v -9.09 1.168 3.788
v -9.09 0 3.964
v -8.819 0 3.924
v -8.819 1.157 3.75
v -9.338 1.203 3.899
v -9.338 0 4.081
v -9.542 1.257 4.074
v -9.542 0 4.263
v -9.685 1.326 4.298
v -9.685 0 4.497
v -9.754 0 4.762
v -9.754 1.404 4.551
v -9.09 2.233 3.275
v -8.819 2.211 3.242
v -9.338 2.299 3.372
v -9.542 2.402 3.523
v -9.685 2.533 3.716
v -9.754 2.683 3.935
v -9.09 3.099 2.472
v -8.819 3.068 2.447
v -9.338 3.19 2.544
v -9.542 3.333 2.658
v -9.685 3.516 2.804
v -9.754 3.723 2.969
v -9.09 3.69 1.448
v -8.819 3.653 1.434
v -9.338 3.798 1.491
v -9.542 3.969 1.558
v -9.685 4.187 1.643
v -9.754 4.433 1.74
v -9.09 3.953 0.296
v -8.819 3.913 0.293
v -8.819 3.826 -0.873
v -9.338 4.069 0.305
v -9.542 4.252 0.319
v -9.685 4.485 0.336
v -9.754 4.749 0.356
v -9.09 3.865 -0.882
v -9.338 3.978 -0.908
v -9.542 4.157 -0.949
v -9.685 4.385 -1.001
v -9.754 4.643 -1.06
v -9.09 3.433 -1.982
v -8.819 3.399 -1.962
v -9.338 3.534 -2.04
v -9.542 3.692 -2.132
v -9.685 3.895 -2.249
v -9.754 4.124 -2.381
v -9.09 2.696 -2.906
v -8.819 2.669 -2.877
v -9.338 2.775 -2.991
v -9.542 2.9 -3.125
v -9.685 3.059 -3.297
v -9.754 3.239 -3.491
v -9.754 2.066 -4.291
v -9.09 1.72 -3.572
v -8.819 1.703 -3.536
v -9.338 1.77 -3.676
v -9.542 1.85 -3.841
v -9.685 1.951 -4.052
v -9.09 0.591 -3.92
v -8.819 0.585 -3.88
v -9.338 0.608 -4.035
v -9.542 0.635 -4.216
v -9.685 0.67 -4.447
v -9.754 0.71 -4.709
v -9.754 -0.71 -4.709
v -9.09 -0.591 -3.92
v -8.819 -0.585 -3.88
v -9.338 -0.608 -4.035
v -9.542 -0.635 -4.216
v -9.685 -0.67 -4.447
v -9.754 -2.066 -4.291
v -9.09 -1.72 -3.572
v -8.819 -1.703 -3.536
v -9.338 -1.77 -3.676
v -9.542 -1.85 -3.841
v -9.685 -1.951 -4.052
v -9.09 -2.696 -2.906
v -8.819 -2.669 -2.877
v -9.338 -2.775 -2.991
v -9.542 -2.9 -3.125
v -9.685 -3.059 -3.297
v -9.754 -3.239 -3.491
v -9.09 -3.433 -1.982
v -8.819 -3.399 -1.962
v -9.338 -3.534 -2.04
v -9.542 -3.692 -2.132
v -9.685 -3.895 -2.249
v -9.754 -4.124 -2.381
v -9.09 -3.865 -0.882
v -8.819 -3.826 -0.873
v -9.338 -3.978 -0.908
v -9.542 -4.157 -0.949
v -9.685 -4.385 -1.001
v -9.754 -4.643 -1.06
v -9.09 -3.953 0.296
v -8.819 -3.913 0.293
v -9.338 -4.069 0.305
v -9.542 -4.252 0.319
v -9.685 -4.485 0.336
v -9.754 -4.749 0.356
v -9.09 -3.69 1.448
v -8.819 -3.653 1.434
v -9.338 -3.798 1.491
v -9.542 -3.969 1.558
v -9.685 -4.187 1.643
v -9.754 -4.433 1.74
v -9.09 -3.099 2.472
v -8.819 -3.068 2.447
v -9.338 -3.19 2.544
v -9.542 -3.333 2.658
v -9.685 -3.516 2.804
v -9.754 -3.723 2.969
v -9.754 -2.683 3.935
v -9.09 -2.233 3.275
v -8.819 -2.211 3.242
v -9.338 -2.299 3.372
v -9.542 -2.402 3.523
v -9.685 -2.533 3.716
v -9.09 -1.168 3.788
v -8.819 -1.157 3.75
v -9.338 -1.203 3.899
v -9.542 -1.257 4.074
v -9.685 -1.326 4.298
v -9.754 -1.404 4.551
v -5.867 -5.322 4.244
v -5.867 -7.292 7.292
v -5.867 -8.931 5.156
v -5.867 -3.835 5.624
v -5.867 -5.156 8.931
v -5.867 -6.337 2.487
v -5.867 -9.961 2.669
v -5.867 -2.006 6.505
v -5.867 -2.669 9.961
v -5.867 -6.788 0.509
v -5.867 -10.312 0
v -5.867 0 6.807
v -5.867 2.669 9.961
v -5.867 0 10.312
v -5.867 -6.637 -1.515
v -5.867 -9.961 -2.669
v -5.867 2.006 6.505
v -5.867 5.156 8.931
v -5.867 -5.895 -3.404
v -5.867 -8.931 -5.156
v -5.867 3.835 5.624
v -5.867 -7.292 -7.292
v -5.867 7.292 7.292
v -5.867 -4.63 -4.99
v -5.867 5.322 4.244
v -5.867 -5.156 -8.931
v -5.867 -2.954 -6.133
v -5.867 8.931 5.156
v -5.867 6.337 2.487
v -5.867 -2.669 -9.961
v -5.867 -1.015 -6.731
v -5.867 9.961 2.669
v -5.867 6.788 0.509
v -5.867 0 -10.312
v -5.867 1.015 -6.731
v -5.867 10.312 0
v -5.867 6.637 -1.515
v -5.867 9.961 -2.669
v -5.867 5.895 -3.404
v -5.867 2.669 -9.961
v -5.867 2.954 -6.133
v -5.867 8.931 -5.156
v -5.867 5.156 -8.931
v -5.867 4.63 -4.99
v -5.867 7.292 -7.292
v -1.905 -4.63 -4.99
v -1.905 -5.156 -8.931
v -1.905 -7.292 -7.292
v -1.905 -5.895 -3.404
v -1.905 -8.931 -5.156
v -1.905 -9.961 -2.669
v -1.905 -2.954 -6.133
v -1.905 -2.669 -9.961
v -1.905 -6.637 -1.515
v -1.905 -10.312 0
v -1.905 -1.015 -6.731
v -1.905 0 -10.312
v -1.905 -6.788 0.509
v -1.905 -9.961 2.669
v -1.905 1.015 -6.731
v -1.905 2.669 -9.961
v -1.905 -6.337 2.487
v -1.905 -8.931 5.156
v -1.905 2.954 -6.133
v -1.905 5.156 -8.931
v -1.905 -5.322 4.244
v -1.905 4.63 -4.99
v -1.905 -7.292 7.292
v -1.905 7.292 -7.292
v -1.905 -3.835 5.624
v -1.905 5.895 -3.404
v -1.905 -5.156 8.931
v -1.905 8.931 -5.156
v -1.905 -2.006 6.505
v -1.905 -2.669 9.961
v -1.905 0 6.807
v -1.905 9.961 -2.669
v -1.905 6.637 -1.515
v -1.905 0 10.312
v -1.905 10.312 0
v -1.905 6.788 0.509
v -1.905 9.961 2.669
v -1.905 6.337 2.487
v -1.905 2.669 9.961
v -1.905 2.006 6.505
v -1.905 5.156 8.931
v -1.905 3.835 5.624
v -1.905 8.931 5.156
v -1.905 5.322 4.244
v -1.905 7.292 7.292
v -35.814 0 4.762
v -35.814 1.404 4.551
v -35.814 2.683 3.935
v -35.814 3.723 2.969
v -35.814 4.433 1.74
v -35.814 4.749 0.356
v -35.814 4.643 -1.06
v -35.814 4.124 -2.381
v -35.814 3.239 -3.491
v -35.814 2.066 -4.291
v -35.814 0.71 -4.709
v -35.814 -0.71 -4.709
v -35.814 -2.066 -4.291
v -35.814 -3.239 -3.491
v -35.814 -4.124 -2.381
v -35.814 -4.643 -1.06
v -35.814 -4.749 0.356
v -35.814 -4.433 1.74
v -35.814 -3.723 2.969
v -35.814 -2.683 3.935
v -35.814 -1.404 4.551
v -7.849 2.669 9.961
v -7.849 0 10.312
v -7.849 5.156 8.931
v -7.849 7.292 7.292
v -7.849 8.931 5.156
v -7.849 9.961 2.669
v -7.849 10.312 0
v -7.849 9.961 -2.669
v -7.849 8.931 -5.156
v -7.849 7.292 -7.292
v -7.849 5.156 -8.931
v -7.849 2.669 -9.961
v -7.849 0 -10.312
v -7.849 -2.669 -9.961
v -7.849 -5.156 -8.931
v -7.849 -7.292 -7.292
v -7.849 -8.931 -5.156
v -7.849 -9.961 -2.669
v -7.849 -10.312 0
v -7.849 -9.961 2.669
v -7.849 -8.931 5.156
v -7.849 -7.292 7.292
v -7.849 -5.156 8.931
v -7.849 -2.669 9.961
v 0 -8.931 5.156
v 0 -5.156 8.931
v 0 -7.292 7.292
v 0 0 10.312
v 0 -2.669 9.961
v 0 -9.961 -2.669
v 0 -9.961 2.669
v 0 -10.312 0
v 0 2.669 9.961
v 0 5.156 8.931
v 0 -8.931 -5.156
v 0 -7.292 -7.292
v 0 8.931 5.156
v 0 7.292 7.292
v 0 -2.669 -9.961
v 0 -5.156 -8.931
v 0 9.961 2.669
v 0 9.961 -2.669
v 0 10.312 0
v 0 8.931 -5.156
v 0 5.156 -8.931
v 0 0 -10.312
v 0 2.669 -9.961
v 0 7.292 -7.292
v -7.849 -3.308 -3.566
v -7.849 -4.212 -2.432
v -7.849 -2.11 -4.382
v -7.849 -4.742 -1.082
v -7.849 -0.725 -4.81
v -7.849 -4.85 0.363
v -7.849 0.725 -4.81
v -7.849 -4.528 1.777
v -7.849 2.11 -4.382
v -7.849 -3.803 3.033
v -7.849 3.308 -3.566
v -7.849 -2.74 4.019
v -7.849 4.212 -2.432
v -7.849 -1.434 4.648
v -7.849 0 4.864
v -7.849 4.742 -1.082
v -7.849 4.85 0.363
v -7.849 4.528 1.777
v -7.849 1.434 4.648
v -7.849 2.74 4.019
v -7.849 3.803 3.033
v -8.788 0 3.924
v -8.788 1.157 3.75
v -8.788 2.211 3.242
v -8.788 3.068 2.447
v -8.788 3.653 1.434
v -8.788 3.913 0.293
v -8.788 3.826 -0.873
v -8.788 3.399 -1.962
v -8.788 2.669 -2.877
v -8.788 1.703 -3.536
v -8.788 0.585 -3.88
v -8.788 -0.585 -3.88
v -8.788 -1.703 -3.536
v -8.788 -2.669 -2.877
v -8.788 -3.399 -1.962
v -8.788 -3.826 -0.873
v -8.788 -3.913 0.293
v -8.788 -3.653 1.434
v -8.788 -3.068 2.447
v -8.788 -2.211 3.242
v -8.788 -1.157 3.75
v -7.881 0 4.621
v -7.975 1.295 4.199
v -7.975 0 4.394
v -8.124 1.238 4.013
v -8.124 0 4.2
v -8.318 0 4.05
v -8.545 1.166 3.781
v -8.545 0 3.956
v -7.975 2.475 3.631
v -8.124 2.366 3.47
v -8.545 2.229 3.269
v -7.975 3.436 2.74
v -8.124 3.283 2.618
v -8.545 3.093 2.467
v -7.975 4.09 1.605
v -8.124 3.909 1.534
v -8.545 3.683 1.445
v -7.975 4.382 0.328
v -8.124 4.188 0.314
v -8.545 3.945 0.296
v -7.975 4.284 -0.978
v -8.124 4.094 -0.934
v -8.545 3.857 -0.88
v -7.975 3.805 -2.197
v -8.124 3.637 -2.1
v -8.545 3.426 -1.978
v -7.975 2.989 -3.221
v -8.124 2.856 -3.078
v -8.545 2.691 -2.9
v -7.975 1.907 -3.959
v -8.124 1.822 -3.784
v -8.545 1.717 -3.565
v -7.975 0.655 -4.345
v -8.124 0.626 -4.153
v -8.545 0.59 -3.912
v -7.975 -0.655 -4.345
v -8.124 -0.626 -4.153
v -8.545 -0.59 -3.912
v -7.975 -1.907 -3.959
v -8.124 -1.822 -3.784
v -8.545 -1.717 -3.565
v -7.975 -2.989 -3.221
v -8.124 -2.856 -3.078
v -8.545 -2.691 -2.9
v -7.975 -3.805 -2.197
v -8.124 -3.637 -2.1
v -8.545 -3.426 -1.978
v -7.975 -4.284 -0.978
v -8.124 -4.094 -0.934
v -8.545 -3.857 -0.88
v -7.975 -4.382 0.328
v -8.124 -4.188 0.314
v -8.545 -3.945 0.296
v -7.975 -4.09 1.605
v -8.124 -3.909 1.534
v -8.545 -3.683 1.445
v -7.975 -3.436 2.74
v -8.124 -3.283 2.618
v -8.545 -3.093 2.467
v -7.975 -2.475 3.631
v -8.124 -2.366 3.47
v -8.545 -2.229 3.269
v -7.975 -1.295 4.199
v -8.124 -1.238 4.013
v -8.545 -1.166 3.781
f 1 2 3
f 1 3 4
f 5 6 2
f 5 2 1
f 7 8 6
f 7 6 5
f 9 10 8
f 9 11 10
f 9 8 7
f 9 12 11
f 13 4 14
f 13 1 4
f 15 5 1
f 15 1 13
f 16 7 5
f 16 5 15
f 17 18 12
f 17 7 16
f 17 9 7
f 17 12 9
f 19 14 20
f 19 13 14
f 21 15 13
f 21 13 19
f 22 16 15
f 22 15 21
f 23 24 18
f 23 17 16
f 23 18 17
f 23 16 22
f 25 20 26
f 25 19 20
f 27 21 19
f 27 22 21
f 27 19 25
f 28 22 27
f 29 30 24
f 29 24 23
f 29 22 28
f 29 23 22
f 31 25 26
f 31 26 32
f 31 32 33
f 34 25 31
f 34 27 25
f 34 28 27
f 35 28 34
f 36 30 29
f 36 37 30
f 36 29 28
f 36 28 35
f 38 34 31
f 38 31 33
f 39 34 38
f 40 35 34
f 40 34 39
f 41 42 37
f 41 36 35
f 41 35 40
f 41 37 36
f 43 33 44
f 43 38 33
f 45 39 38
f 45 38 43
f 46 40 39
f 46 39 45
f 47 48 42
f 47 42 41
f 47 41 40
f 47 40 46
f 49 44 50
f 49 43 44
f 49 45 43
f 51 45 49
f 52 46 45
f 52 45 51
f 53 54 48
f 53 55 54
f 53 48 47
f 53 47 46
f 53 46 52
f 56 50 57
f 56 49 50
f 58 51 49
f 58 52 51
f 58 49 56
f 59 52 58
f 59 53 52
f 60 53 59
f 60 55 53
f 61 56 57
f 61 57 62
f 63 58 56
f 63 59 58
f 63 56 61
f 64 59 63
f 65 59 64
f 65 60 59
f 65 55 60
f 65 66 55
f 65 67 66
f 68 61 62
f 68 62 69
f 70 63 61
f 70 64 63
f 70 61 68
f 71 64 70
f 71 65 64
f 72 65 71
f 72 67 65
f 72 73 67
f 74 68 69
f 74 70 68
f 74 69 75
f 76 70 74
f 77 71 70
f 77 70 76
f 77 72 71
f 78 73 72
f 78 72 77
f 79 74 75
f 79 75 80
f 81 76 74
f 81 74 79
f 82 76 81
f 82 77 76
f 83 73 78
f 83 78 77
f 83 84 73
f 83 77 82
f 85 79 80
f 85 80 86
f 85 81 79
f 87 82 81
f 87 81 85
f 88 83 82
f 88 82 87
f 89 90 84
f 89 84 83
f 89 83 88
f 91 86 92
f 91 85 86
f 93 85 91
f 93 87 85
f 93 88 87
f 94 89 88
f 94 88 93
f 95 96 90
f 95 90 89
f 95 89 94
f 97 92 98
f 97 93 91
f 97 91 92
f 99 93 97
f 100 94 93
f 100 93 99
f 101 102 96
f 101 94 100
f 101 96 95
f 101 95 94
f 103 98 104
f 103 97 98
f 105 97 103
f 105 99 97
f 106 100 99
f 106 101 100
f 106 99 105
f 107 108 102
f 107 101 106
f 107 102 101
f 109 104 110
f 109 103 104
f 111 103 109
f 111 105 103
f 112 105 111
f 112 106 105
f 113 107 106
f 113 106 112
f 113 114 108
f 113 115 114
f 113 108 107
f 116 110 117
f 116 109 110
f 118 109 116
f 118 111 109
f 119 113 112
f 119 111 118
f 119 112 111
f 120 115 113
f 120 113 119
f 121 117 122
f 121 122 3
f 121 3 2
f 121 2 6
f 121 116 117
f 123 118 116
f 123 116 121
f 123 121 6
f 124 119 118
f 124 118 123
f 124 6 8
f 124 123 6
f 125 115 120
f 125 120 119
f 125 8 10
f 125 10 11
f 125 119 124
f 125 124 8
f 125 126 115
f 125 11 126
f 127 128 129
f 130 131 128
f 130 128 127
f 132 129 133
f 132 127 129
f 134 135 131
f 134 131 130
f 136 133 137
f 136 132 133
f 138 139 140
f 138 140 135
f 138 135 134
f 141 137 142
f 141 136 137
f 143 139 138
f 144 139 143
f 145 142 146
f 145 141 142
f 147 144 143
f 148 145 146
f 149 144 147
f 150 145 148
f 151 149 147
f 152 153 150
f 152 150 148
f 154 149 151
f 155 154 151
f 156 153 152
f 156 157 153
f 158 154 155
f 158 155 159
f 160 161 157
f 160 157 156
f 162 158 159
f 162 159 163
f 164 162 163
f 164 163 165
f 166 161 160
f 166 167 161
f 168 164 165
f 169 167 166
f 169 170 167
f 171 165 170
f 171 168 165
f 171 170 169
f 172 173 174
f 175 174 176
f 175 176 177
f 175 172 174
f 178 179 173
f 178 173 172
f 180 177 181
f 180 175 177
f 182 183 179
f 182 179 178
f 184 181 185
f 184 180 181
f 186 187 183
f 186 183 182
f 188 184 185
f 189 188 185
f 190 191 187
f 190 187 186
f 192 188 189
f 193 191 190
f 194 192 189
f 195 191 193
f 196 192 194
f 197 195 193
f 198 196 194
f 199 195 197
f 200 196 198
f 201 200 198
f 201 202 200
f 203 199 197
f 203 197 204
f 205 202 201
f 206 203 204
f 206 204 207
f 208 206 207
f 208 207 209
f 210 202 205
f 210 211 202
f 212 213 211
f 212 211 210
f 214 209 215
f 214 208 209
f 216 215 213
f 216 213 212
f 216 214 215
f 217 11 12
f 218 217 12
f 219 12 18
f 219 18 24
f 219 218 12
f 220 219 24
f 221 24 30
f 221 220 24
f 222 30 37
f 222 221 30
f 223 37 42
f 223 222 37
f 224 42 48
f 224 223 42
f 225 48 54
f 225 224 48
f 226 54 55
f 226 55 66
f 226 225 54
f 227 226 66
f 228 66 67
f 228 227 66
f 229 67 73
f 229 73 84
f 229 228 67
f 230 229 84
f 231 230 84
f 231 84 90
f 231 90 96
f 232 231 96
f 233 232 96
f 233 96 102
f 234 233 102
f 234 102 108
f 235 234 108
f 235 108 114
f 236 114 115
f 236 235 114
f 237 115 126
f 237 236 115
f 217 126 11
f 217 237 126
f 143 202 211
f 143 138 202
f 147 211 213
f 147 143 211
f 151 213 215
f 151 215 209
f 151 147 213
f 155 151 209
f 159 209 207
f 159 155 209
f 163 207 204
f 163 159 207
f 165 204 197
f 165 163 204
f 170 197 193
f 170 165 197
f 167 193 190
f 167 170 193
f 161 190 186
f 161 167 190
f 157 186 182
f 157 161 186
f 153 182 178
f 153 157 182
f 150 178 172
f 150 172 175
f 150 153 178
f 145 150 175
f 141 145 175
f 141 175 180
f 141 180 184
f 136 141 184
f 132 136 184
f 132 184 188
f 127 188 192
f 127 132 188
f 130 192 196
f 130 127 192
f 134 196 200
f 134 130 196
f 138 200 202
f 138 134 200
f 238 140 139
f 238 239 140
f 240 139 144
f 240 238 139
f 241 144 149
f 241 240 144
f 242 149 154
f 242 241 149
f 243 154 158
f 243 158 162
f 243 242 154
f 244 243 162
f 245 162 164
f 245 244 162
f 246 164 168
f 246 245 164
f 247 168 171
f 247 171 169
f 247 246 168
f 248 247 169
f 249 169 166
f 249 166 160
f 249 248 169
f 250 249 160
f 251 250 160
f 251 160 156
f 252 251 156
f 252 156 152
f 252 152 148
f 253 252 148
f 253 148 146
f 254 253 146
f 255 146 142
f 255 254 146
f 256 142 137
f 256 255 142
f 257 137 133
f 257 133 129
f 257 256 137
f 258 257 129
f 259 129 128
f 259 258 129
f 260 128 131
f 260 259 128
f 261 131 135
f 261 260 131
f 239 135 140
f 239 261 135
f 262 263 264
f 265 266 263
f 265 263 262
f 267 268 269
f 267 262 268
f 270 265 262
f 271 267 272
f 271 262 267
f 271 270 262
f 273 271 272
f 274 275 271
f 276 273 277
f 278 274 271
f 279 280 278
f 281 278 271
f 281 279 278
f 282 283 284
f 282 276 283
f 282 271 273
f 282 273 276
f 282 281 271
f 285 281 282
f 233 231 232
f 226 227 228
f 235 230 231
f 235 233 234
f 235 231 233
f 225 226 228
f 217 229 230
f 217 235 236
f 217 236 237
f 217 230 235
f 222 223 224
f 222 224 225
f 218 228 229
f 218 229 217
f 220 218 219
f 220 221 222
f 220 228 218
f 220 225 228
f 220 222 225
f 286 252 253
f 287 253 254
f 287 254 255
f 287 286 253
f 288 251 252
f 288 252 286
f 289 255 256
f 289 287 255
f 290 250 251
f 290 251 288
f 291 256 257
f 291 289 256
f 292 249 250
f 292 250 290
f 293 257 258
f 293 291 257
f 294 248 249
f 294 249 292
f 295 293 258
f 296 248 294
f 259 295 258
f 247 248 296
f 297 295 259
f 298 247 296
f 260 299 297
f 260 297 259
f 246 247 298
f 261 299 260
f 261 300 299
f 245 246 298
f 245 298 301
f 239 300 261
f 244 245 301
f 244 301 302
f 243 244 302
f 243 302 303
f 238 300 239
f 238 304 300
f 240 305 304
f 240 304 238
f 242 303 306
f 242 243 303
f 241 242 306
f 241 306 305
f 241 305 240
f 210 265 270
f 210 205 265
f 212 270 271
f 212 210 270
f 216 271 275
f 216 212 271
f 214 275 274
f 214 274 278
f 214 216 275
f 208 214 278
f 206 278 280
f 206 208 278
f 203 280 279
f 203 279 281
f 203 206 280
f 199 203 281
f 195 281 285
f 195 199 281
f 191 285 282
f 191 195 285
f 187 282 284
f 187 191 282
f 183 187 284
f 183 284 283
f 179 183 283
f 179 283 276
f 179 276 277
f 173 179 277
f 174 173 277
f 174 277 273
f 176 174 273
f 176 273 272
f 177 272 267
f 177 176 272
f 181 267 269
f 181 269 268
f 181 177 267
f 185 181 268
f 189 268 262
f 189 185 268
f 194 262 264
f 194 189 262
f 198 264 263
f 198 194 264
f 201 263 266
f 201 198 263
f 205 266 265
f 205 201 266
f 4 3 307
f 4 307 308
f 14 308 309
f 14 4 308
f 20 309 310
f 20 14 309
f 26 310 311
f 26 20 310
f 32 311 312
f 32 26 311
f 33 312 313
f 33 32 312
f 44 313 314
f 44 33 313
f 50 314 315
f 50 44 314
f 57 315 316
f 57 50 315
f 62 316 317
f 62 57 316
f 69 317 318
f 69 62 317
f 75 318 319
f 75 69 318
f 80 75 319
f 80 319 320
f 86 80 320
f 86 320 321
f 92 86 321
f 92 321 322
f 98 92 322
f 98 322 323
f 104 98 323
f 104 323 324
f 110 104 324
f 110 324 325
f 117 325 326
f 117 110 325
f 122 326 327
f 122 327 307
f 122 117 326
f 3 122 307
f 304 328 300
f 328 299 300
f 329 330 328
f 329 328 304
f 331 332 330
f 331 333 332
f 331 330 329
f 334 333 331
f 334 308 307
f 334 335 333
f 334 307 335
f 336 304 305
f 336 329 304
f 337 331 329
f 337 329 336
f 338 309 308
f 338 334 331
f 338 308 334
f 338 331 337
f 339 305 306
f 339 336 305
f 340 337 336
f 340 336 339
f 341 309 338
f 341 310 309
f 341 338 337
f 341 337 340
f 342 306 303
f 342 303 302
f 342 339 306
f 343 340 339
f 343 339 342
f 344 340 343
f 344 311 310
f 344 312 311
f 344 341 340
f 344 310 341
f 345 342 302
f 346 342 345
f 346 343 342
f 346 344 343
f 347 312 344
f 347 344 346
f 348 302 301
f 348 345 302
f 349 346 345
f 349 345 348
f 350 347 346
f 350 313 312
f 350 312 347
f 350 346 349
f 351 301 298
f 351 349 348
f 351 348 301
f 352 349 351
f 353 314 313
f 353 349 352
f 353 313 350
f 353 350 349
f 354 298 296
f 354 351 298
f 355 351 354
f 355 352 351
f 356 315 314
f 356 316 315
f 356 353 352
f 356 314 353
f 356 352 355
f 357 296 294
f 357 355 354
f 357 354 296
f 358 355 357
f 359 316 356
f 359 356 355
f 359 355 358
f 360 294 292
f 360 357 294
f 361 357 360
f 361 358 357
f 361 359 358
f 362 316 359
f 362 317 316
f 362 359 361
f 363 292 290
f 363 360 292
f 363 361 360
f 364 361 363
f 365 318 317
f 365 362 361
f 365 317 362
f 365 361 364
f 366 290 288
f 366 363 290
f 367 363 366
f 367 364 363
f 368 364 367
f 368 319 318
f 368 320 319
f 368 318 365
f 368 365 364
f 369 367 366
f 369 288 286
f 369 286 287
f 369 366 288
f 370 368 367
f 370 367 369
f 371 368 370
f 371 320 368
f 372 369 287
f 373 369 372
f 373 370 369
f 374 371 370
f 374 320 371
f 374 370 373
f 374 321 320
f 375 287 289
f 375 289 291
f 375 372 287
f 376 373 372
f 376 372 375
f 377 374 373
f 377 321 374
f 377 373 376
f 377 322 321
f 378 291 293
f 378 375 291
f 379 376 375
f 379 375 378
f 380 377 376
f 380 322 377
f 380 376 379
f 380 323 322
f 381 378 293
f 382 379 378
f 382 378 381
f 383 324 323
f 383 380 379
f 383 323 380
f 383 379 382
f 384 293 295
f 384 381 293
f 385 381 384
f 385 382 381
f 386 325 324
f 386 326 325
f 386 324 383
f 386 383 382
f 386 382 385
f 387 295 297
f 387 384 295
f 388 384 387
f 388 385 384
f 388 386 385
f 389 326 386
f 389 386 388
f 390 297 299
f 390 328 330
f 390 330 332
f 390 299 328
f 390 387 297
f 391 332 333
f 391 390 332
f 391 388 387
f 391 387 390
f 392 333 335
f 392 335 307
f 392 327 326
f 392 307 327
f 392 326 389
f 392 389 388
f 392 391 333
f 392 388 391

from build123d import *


# Not quite as in the source:
# - a fillet or chamfer that OpenCascade refuses, or shapes differently, is made with other operations: its cross-section is extruded or revolved along the edge and cut away or added


with BuildPart() as f1:
    # F0 (on Front) → F1 (revolve)
    with BuildSketch(Plane.XZ):
        Polygon((-35.814, 0), (0, 0), (0, 10.3124), (-1.905, 10.3124), (-1.905, 6.8072), (-5.8674, 6.8072), (-5.8674, 10.3124), (-7.8486, 10.3124), (-7.8486, 3.9243), (-9.7536, 3.9243), (-9.7536, 4.7625), (-35.814, 4.7625), align=None)
    revolve(axis=Axis((-27.8073139489, 0, 0), (-1, 0, 0)))

    # F2: fillet of radius 0.9398 on 2 edges, made by hand

    # F2_s1 → F2_t2 (revolve)
    with BuildSketch(Plane.XZ):
        with BuildLine():
            ThreePointArc((-7.8486, 4.8641), (-8.123861047, 4.199561047), (-8.7884, 3.9243))
            Line((-8.7884, 3.9243), (-7.8486, 3.9243))
            Line((-7.8486, 3.9243), (-7.8486, 4.8641))
        make_face()
    revolve(axis=Axis((-7.8486, 0, 0), (-1, 0, 0)))

    # F2_s3 → F2_t4 (revolve)
    with BuildSketch(Plane.XZ):
        with BuildLine():
            ThreePointArc((-8.8193080328, 3.9243), (-9.4468988071, 4.1645616808), (-9.7536, 4.7625))
            Line((-9.7536, 4.7625), (-9.7536, 3.9243))
            Line((-9.7536, 3.9243), (-8.8193080328, 3.9243))
        make_face()
    revolve(axis=Axis((-9.7536, 0, 0), (-1, 0, 0)))


solid = f1.part
